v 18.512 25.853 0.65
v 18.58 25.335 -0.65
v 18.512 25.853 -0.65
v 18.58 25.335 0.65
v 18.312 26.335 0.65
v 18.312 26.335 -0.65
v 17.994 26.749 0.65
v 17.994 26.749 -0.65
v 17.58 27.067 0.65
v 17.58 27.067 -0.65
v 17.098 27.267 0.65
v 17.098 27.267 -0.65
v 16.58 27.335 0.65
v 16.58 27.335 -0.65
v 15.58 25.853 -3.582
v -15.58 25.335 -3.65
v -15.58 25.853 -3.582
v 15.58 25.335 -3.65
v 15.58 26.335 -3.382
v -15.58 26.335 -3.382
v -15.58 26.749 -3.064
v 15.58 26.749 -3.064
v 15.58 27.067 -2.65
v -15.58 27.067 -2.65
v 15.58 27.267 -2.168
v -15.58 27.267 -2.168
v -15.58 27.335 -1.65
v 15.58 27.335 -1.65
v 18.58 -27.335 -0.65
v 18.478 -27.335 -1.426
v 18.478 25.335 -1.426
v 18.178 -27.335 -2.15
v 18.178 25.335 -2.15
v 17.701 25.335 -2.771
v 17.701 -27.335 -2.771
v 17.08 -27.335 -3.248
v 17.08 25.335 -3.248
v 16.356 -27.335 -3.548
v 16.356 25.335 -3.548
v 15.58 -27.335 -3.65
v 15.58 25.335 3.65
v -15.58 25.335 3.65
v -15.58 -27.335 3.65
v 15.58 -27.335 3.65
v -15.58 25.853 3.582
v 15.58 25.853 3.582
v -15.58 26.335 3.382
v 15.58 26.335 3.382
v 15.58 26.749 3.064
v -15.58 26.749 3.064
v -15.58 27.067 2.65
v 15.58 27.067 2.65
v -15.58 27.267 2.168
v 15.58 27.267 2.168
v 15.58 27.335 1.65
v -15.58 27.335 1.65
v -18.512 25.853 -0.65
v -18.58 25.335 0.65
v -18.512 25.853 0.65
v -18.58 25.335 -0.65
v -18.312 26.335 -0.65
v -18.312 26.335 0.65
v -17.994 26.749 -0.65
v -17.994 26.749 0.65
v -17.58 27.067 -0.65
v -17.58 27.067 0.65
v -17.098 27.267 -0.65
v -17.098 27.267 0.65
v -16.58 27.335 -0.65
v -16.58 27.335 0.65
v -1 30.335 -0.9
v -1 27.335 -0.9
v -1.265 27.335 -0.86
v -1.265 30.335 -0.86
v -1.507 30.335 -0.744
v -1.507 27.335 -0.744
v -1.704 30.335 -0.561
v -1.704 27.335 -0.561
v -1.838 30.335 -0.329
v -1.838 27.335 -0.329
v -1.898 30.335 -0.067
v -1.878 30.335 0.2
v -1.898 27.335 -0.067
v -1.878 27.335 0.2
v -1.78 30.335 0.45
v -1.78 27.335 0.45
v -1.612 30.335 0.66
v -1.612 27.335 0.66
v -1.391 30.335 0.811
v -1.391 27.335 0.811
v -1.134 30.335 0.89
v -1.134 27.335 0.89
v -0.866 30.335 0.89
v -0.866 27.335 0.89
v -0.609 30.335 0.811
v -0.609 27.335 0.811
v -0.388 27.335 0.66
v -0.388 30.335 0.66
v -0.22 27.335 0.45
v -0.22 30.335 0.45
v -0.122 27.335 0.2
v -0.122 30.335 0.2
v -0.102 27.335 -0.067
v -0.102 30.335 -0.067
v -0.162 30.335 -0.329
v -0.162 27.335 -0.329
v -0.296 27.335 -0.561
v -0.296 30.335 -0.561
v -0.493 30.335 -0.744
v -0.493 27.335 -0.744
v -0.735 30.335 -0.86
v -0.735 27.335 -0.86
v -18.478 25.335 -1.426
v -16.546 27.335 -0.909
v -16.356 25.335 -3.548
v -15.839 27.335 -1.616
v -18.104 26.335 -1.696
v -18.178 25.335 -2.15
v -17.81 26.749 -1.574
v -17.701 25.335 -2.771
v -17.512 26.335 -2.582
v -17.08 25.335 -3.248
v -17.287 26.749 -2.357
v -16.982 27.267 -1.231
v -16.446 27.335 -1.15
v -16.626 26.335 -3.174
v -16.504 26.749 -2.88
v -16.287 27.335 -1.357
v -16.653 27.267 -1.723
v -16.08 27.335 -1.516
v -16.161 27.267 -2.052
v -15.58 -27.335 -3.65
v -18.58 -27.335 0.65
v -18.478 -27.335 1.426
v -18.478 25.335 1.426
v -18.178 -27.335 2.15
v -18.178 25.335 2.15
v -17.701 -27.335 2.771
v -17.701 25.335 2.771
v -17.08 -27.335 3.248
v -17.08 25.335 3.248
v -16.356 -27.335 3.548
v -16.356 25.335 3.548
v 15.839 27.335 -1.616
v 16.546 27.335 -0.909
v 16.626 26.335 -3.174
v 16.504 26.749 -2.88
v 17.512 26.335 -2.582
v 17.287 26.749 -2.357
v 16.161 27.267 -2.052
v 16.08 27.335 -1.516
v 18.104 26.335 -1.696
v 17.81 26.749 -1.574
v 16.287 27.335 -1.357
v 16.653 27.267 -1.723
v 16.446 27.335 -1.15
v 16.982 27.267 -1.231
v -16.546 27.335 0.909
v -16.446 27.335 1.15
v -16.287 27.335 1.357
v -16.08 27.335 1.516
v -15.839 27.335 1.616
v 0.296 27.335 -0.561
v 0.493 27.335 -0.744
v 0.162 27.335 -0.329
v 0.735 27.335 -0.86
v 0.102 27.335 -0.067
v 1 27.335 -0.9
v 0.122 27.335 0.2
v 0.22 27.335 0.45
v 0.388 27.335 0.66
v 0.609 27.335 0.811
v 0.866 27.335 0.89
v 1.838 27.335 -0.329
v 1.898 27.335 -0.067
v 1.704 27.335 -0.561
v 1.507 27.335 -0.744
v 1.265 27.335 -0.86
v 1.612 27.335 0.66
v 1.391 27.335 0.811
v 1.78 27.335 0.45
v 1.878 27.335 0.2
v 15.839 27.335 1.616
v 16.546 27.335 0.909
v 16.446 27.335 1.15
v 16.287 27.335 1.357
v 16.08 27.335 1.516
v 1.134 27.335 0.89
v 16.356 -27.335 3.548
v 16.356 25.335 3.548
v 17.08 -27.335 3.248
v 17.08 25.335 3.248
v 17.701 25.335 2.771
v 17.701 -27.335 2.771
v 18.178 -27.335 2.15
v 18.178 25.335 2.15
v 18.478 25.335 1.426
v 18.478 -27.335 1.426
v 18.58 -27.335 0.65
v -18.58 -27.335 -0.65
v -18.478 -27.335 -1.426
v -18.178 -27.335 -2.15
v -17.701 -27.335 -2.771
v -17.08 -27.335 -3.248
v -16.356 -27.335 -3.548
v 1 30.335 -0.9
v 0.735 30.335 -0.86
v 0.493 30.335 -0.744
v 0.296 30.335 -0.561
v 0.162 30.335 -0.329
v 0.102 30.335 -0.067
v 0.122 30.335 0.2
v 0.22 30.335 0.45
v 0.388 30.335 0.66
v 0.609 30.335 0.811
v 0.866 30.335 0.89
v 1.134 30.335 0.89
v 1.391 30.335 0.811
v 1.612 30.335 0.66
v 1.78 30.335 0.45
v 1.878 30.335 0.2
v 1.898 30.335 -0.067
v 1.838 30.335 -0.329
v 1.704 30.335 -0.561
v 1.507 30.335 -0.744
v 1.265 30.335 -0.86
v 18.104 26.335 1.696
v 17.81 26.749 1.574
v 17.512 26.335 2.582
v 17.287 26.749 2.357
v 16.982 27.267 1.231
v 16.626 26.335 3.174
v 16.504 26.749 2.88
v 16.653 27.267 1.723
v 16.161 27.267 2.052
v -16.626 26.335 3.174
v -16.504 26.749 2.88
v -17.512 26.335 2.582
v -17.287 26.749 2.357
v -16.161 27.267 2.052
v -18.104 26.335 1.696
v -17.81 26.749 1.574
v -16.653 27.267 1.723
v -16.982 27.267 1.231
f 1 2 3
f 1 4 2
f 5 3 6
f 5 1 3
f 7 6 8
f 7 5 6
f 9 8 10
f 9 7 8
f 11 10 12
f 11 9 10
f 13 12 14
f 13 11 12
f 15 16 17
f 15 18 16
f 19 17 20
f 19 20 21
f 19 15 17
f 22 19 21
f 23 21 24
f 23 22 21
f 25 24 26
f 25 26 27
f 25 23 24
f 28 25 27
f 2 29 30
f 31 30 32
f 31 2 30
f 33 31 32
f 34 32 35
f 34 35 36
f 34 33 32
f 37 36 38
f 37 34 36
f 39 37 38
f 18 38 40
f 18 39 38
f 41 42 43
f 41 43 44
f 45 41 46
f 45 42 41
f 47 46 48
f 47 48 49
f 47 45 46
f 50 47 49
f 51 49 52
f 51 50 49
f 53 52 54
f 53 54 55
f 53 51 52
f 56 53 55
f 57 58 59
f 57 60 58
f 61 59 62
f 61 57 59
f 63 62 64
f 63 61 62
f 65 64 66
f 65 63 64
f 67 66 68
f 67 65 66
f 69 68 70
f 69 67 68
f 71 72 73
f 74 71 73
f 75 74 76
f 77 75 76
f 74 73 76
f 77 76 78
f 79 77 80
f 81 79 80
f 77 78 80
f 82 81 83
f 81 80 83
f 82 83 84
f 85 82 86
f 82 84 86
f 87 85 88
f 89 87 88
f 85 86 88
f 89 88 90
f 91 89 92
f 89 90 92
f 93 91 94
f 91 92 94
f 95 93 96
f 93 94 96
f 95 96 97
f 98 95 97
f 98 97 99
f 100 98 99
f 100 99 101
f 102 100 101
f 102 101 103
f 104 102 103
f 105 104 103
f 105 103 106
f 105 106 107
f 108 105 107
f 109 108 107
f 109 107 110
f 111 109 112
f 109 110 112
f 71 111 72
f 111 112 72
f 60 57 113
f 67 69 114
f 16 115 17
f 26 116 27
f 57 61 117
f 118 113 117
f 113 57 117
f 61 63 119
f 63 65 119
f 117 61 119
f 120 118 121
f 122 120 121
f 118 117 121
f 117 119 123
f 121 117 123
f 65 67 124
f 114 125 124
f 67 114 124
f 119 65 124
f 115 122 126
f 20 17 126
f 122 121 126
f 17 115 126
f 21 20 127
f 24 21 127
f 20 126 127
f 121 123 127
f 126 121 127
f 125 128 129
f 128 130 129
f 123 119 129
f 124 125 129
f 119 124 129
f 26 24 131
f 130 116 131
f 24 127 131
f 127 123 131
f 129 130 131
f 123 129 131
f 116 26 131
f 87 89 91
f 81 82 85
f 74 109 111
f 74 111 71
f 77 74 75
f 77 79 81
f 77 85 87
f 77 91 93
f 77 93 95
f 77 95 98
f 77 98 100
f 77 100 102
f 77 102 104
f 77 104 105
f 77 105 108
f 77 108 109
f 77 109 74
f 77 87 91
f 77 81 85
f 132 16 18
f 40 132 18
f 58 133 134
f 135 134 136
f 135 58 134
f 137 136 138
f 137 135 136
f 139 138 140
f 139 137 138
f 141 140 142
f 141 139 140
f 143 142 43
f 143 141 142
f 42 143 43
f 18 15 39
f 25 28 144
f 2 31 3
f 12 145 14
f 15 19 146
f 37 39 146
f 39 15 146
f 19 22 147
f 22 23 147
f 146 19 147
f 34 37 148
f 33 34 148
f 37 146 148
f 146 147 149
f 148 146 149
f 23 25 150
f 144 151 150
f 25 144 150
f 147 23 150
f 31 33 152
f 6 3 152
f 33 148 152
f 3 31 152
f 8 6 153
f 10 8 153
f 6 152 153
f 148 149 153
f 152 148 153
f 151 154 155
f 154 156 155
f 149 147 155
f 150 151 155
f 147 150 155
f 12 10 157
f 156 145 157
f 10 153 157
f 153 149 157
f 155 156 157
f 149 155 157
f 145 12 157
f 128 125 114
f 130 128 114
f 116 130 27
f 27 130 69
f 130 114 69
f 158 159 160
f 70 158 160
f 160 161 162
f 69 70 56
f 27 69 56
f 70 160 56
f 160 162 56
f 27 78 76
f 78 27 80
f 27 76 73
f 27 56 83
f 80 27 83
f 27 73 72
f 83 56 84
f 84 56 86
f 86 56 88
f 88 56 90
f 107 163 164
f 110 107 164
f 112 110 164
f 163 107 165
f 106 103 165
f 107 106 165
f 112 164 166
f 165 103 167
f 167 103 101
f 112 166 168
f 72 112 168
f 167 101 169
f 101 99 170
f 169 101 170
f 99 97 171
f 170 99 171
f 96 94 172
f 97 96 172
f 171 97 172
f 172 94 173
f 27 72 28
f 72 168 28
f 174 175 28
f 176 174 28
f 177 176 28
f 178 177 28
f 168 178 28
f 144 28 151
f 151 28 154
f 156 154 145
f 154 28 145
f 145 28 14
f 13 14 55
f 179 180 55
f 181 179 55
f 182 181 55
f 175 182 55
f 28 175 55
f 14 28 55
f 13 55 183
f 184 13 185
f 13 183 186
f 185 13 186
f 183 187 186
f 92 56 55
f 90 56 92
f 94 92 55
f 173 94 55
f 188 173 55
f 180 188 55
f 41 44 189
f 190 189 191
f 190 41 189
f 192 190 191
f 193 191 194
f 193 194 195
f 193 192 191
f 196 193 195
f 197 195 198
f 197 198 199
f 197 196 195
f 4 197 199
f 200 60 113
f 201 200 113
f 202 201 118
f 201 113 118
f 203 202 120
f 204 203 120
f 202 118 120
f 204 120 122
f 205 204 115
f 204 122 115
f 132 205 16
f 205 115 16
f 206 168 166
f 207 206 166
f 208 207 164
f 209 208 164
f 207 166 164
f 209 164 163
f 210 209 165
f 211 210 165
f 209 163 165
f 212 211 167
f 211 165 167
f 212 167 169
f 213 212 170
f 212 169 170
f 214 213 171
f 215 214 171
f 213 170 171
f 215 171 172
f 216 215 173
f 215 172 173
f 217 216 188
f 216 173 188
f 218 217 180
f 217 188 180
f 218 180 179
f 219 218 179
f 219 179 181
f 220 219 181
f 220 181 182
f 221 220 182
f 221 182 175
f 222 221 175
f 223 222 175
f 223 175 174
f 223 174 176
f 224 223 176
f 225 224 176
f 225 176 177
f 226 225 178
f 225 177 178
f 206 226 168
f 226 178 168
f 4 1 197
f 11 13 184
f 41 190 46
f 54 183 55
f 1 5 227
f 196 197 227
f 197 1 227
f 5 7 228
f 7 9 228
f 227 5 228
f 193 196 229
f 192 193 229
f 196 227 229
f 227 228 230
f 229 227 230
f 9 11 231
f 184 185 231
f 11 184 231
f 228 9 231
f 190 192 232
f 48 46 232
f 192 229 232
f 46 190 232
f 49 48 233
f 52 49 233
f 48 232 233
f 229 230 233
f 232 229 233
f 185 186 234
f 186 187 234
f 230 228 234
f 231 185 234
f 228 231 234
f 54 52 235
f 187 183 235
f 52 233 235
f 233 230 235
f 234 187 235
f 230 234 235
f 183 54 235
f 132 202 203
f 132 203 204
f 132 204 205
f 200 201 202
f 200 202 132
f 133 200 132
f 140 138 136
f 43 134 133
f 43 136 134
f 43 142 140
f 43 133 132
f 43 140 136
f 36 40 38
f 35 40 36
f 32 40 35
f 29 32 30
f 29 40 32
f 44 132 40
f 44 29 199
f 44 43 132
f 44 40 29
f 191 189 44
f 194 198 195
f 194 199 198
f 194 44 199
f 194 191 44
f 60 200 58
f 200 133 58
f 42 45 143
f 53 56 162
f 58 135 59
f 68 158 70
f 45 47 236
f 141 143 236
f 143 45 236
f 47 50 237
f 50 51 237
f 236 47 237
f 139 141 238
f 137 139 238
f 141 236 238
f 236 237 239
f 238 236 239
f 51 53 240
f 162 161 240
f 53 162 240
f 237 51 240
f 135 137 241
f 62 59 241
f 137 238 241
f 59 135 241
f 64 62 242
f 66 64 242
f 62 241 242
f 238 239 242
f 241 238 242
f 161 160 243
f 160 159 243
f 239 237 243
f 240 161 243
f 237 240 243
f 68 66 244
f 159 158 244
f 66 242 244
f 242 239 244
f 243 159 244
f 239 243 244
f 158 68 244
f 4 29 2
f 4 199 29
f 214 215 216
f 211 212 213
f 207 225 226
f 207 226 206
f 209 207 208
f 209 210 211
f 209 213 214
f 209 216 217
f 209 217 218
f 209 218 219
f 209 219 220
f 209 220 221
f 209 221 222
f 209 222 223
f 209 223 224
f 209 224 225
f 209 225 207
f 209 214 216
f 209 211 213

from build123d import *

# Parameters (mm, degrees)
SKETCH1_W           = 37.16
SKETCH1_H           = 54.67
BOSS_EXTRUDE1_DEPTH = 3.65
FILLET1_R           = 3
FILLET2_R           = 2
SKETCH2_R           = 0.900344027
BOSS_EXTRUDE2_DEPTH = 3


with BuildPart() as part:
    # Sketch1 → Boss-Extrude1 (new, symmetric)
    with BuildSketch(Plane.XY):
        Rectangle(SKETCH1_W, SKETCH1_H)
    extrude(amount=BOSS_EXTRUDE1_DEPTH, both=True)

    # Fillet1
    fillet1_edges = [part.edges().sort_by_distance(p)[0] for p in [
        (-18.58, 0, 3.65),
        (18.58, 0, 3.65),
        (-18.58, 0, -3.65),
        (18.58, 0, -3.65),
    ]]
    fillet(fillet1_edges, radius=FILLET1_R)

    # Fillet2
    fillet2_edges = [part.edges().sort_by_distance(p)[0] for p in [
        (-18.58, 27.335, 0),
        (0, 27.335, -3.65),
        (0, 27.335, 3.65),
        (18.58, 27.335, 0),
        (17.701320344, 27.335, 2.771320344),
        (17.701320344, 27.335, -2.771320344),
        (-17.701320344, 27.335, 2.771320344),
        (-17.701320344, 27.335, -2.771320344),
    ]]
    fillet(fillet2_edges, radius=FILLET2_R)

    # Sketch2 → Boss-Extrude2 (add)
    with BuildSketch(Plane(origin=(0, 27.335, 0), x_dir=(1, 0, 0), z_dir=(0, 1, 0))):
        with Locations(Location((-1, 0, 0), (0, 0, 90))):
            Circle(SKETCH2_R)
        with Locations(Location((1, 0, 0), (0, 0, 90))):
            Circle(SKETCH2_R)
    extrude(amount=BOSS_EXTRUDE2_DEPTH)


solid = part.part
